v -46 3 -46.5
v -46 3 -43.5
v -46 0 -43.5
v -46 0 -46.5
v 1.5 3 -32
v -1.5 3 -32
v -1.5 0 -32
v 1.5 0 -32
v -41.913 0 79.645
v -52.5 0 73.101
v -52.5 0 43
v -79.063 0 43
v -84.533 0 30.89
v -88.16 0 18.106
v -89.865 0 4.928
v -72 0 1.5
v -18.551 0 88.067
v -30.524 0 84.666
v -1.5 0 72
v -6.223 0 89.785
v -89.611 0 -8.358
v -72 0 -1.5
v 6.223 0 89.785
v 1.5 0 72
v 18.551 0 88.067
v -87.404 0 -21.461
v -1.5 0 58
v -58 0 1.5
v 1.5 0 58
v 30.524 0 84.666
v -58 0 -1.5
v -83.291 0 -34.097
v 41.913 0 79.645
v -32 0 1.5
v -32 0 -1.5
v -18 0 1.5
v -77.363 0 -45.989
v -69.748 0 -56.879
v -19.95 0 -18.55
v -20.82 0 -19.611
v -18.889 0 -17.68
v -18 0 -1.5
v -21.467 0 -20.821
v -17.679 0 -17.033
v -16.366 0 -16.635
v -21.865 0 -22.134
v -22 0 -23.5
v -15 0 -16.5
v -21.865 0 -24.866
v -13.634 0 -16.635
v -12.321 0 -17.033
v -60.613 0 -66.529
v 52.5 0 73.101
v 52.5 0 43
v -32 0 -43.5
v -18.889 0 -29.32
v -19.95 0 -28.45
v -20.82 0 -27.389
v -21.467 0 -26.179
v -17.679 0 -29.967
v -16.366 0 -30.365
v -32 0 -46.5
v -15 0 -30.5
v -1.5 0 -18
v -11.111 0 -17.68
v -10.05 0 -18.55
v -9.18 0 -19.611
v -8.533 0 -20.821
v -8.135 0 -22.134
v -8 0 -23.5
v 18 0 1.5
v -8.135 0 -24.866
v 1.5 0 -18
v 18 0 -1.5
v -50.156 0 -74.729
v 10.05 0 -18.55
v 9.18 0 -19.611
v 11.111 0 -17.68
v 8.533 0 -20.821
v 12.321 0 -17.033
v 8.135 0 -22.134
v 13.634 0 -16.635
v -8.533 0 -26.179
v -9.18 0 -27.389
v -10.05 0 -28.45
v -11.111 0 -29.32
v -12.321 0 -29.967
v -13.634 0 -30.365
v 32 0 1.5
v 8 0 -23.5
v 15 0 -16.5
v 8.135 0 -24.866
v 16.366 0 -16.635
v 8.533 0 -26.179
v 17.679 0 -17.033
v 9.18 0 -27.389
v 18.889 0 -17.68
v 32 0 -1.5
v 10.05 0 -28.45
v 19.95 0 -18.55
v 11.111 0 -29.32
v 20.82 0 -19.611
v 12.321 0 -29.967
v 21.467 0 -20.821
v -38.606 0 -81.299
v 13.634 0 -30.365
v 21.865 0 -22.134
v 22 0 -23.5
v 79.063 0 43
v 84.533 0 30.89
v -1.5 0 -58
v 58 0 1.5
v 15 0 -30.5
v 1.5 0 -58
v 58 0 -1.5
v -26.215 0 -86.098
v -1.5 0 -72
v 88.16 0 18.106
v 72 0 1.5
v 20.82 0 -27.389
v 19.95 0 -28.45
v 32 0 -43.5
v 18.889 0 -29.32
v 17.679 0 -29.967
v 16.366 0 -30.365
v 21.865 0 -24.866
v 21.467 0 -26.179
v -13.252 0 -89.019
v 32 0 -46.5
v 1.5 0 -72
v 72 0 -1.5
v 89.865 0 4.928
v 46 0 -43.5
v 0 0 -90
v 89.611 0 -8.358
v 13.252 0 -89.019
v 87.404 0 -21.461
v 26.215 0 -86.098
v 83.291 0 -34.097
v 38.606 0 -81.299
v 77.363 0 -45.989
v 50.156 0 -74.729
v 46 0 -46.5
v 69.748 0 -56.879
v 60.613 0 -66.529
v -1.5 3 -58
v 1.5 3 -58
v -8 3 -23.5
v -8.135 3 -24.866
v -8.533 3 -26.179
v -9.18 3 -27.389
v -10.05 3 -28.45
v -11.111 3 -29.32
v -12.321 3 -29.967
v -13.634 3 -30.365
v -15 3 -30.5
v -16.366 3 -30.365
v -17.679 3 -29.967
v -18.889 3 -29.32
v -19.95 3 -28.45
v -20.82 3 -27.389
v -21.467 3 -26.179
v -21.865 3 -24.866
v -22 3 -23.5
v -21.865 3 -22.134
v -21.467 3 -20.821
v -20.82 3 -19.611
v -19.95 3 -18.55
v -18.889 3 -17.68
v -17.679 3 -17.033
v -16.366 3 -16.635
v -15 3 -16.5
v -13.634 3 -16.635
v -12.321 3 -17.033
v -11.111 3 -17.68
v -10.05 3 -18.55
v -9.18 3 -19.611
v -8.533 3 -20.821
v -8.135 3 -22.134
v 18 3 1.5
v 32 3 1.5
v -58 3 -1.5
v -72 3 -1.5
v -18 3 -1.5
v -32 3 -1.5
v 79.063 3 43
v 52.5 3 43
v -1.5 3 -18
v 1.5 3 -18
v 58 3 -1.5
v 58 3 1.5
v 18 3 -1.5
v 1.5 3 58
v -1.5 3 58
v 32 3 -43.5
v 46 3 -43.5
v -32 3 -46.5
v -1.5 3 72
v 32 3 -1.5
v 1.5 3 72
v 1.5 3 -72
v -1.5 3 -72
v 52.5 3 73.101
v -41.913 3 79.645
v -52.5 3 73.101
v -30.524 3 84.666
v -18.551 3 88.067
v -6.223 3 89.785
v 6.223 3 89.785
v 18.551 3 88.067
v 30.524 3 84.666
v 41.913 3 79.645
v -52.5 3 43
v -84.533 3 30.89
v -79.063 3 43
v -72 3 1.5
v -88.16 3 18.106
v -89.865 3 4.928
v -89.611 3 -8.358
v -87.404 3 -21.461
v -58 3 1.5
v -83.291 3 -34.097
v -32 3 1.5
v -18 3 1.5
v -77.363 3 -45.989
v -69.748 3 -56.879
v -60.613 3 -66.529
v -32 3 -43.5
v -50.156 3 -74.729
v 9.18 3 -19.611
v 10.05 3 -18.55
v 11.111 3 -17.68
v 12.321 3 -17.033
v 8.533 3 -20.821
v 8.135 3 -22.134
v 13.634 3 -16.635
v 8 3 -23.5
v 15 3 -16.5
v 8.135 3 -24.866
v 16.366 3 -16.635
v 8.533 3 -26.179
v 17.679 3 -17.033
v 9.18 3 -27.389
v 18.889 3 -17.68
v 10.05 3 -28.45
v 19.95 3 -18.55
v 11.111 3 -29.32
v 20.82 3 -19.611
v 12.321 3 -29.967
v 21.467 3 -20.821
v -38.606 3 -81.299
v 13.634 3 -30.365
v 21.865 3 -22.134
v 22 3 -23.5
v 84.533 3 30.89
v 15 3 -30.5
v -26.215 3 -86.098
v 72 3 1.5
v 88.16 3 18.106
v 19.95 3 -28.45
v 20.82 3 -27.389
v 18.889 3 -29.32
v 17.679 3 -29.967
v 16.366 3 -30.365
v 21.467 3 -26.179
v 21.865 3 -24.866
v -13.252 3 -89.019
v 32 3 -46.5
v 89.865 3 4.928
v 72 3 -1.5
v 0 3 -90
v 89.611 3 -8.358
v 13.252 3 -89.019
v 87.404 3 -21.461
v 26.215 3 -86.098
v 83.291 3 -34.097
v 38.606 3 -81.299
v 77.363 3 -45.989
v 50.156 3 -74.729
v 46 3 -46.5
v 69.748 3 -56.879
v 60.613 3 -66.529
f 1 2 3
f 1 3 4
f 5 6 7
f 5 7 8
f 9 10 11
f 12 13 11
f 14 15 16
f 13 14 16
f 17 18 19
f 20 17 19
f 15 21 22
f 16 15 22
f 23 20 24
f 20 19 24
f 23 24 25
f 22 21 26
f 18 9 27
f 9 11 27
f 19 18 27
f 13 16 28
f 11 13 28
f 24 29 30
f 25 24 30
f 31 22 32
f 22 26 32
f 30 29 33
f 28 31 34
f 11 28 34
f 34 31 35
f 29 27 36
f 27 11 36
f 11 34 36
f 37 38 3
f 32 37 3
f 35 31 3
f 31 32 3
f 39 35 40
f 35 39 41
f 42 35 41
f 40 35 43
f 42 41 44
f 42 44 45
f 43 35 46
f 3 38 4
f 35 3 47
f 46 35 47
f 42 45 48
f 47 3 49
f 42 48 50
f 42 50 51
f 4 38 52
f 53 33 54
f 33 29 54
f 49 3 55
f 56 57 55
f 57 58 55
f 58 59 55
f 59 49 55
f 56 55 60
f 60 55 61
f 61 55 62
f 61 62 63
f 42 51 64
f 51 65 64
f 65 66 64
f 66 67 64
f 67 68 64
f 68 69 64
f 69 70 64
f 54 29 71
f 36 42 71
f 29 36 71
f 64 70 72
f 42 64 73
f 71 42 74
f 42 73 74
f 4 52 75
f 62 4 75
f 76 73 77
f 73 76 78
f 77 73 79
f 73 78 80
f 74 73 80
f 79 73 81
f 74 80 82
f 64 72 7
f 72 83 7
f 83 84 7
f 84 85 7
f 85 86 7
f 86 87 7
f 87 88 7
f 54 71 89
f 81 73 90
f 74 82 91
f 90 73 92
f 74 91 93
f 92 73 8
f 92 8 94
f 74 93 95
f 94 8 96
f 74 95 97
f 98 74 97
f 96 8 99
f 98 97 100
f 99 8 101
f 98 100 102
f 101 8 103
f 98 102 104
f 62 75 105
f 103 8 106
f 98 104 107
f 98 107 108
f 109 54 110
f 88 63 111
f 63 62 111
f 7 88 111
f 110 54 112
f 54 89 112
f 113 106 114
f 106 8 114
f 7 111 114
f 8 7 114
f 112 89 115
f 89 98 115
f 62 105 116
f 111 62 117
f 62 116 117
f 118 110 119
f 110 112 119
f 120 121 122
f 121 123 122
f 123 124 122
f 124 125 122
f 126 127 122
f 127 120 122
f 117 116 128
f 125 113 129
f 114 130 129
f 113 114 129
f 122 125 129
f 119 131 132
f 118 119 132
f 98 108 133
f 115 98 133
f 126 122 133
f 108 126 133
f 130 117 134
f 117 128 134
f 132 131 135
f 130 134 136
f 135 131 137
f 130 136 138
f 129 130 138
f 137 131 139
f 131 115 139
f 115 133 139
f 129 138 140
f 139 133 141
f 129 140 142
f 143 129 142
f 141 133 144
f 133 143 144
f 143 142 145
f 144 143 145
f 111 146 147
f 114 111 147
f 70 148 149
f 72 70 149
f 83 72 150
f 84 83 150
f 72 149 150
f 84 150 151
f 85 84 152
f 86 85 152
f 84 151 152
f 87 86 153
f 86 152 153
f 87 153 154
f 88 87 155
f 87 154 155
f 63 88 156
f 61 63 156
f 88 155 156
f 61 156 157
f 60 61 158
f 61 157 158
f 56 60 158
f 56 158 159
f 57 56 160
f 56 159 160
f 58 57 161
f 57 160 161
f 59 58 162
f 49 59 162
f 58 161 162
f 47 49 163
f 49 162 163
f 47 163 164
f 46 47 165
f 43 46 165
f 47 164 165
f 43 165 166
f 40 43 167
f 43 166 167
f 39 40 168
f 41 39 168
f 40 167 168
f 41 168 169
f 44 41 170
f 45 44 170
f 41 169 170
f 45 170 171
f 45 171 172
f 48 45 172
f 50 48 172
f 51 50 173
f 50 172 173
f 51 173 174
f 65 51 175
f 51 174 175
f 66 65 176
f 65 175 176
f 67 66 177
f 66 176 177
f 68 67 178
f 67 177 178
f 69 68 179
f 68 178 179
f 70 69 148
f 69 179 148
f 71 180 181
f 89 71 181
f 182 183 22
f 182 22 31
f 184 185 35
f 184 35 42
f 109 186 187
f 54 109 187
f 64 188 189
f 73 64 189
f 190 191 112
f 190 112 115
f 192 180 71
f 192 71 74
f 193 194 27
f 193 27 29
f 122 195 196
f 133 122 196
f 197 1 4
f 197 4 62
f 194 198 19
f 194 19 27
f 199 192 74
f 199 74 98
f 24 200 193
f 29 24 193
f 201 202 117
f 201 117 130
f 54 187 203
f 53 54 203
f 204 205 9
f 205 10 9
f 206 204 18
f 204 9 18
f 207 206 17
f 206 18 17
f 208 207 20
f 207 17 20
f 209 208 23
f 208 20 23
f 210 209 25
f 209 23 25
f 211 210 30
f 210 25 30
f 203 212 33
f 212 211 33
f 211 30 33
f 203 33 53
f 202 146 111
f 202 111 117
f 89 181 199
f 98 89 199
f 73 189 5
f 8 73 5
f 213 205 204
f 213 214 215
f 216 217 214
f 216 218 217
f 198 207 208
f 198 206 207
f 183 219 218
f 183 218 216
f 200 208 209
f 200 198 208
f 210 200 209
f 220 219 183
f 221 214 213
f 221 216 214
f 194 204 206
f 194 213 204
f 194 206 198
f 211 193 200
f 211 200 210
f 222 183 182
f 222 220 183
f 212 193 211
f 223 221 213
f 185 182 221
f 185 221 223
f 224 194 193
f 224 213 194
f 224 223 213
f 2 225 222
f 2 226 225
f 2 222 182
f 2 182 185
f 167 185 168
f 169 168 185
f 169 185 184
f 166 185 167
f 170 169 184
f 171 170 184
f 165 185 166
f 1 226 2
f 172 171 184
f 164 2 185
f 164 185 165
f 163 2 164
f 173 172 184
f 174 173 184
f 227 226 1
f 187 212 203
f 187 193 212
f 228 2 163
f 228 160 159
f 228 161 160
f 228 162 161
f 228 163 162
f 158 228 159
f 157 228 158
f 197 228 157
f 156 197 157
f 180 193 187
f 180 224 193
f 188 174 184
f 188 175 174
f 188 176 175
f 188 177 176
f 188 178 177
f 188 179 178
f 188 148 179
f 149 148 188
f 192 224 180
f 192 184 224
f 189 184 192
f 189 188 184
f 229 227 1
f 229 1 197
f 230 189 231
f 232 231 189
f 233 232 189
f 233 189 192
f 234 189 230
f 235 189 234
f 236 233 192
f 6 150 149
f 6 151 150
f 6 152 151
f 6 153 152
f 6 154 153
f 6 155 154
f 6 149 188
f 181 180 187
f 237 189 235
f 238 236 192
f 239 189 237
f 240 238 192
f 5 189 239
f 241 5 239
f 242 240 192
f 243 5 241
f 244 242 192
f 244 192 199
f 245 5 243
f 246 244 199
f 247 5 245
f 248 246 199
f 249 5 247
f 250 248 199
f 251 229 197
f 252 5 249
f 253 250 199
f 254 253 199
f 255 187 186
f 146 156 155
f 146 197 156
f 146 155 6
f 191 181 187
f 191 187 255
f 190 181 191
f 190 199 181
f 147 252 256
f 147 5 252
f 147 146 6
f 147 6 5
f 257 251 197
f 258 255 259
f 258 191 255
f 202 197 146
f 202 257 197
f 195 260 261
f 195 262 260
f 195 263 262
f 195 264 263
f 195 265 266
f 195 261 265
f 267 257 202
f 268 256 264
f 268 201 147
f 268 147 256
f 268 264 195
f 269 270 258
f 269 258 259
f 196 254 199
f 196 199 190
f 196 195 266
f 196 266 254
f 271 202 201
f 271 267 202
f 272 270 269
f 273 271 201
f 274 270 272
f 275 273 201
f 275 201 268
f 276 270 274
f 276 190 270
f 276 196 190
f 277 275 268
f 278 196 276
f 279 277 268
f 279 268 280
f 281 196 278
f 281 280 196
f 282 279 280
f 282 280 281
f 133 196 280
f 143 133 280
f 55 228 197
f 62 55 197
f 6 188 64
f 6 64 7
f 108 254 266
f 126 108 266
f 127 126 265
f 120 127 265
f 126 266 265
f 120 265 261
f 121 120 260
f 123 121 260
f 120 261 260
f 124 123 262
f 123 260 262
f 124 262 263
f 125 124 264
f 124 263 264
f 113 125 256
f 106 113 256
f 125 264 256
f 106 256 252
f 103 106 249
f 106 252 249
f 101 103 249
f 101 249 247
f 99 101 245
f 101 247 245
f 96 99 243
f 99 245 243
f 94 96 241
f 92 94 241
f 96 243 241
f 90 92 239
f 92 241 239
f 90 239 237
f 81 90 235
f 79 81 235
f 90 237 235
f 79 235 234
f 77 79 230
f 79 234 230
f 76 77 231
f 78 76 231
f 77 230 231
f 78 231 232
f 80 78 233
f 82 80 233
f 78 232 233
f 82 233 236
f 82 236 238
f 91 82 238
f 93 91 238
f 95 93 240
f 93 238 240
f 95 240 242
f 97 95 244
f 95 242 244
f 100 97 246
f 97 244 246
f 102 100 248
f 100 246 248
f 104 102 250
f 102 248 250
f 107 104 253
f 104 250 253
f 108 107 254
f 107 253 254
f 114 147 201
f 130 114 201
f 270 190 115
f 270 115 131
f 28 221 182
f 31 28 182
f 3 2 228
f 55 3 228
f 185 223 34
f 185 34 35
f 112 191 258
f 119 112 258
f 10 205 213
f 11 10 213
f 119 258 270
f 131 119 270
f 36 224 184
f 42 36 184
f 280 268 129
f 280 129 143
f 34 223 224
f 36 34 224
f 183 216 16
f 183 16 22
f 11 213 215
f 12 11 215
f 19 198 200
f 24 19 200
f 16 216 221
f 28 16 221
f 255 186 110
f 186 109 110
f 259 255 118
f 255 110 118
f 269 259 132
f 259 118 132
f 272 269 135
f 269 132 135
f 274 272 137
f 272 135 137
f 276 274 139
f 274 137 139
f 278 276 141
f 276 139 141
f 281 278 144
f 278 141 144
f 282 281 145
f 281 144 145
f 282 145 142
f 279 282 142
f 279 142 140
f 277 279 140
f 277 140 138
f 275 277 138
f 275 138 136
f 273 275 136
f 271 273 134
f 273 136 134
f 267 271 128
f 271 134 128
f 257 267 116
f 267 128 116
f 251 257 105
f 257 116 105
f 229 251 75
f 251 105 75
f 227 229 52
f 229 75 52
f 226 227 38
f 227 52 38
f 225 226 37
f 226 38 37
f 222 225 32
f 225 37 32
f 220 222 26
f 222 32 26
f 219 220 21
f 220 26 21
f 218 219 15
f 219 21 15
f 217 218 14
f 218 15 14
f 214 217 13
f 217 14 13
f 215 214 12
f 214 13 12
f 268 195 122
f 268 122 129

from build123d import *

# Parameters (mm, degrees)
SKETCH1_R               = 90
BOSS_EXTRUDE1_DEPTH     = 3
CUT_EXTRUDE1_DEPTH      = 1
CUT_EXTRUDE1_DEPTH_BACK = 3
CUT_EXTRUDE2_DEPTH      = 1
CUT_EXTRUDE2_DEPTH_BACK = 3
SKETCH5_W               = 3
SKETCH5_H               = 14
CUT_EXTRUDE4_DEPTH      = 3
SKETCH6_W               = 3
SKETCH6_H               = 14
CUT_EXTRUDE5_DEPTH      = 3
SKETCH8_W               = 3
SKETCH8_H               = 14
CUT_EXTRUDE7_DEPTH      = 3
SKETCH9_W               = 14
SKETCH9_H               = 3
CUT_EXTRUDE8_DEPTH      = 3
SKETCH10_W              = 14
SKETCH10_H              = 3
CUT_EXTRUDE9_DEPTH      = 3
SKETCH11_W              = 14
SKETCH11_H              = 3
CUT_EXTRUDE10_DEPTH     = 3
SKETCH12_W              = 14
SKETCH12_H              = 3
CUT_EXTRUDE11_DEPTH     = 3
SKETCH13_W              = 14
SKETCH13_H              = 3
CUT_EXTRUDE12_DEPTH     = 3
SKETCH14_W              = 14
SKETCH14_H              = 3
CUT_EXTRUDE13_DEPTH     = 3
SKETCH15_R              = 7
CUT_EXTRUDE14_DEPTH     = 3


with BuildPart() as part:
    # Sketch1 → Boss-Extrude1 (new body)
    with BuildSketch(Plane(origin=(0, 0, 0), x_dir=(1, 0, 0), z_dir=(0, 1, 0))):
        Circle(SKETCH1_R)
    extrude(amount=BOSS_EXTRUDE1_DEPTH)

    # Sketch2 → Cut-Extrude1 (cut, two sides)
    with BuildSketch(Plane(origin=(0, 3, 0), x_dir=(1, 0, 0), z_dir=(0, 1, 0))) as cut_extrude1_sk:
        Polygon((-52.5, -516.266848974), (-52.5, -73.100957586), (-52.5, -43), (-79.063265807, -43), (-522.229157195, -43), (-1151.30715458, -667.375610001), (-681.577997385, -1140.642458975), align=None)
    extrude(amount=CUT_EXTRUDE1_DEPTH, mode=Mode.SUBTRACT)
    extrude(cut_extrude1_sk.sketch, amount=-CUT_EXTRUDE1_DEPTH_BACK, mode=Mode.SUBTRACT)

    # Sketch3 → Cut-Extrude2 (cut, two sides)
    with BuildSketch(Plane(origin=(0, 3, 0), x_dir=(1, 0, 0), z_dir=(0, 1, 0))) as cut_extrude2_sk:
        Polygon((52.5, -516.266848974), (52.5, -73.100957586), (52.5, -43), (79.063265807, -43), (522.229157195, -43), (1151.30715458, -667.375610001), (681.577997385, -1140.642458975), align=None)
    extrude(amount=CUT_EXTRUDE2_DEPTH, mode=Mode.SUBTRACT)
    extrude(cut_extrude2_sk.sketch, amount=-CUT_EXTRUDE2_DEPTH_BACK, mode=Mode.SUBTRACT)

    # Sketch5 → Cut-Extrude4 (cut)
    with BuildSketch(Plane(origin=(0, 3, 0), x_dir=(1, 0, 0), z_dir=(0, 1, 0))):
        with Locations((0, 25)):
            Rectangle(SKETCH5_W, SKETCH5_H)
    extrude(amount=-CUT_EXTRUDE4_DEPTH, mode=Mode.SUBTRACT)

    # Sketch6 → Cut-Extrude5 (cut)
    with BuildSketch(Plane(origin=(0, 3, 0), x_dir=(1, 0, 0), z_dir=(0, 1, 0))):
        with Locations((0, 65)):
            Rectangle(SKETCH6_W, SKETCH6_H)
    extrude(amount=-CUT_EXTRUDE5_DEPTH, mode=Mode.SUBTRACT)

    # Sketch8 → Cut-Extrude7 (cut)
    with BuildSketch(Plane(origin=(0, 3, 0), x_dir=(1, 0, 0), z_dir=(0, 1, 0))):
        with Locations((0, -65)):
            Rectangle(SKETCH8_W, SKETCH8_H)
    extrude(amount=-CUT_EXTRUDE7_DEPTH, mode=Mode.SUBTRACT)

    # Sketch9 → Cut-Extrude8 (cut)
    with BuildSketch(Plane(origin=(0, 3, 0), x_dir=(1, 0, 0), z_dir=(0, 1, 0))):
        with Locations((-25, 0)):
            Rectangle(SKETCH9_W, SKETCH9_H)
    extrude(amount=-CUT_EXTRUDE8_DEPTH, mode=Mode.SUBTRACT)

    # Sketch10 → Cut-Extrude9 (cut)
    with BuildSketch(Plane(origin=(0, 3, 0), x_dir=(1, 0, 0), z_dir=(0, 1, 0))):
        with Locations((-65, 0)):
            Rectangle(SKETCH10_W, SKETCH10_H)
    extrude(amount=-CUT_EXTRUDE9_DEPTH, mode=Mode.SUBTRACT)

    # Sketch11 → Cut-Extrude10 (cut)
    with BuildSketch(Plane(origin=(0, 3, 0), x_dir=(1, 0, 0), z_dir=(0, 1, 0))):
        with Locations((25, 0)):
            Rectangle(SKETCH11_W, SKETCH11_H)
    extrude(amount=-CUT_EXTRUDE10_DEPTH, mode=Mode.SUBTRACT)

    # Sketch12 → Cut-Extrude11 (cut)
    with BuildSketch(Plane(origin=(0, 3, 0), x_dir=(1, 0, 0), z_dir=(0, 1, 0))):
        with Locations((65, 0)):
            Rectangle(SKETCH12_W, SKETCH12_H)
    extrude(amount=-CUT_EXTRUDE11_DEPTH, mode=Mode.SUBTRACT)

    # Sketch13 → Cut-Extrude12 (cut)
    with BuildSketch(Plane(origin=(0, 3, 0), x_dir=(1, 0, 0), z_dir=(0, 1, 0))):
        with Locations((-39, 45)):
            Rectangle(SKETCH13_W, SKETCH13_H)
    extrude(amount=-CUT_EXTRUDE12_DEPTH, mode=Mode.SUBTRACT)

    # Sketch14 → Cut-Extrude13 (cut)
    with BuildSketch(Plane(origin=(0, 3, 0), x_dir=(1, 0, 0), z_dir=(0, 1, 0))):
        with Locations((39, 45)):
            Rectangle(SKETCH14_W, SKETCH14_H)
    extrude(amount=-CUT_EXTRUDE13_DEPTH, mode=Mode.SUBTRACT)

    # Sketch15 → Cut-Extrude14 (cut)
    with BuildSketch(Plane(origin=(0, 3, 0), x_dir=(1, 0, 0), z_dir=(0, 1, 0))):
        with Locations((-15, 23.5)):
            Circle(SKETCH15_R)
        with Locations((15, 23.5)):
            Circle(SKETCH15_R)
    extrude(amount=-CUT_EXTRUDE14_DEPTH, mode=Mode.SUBTRACT)


solid = part.part
